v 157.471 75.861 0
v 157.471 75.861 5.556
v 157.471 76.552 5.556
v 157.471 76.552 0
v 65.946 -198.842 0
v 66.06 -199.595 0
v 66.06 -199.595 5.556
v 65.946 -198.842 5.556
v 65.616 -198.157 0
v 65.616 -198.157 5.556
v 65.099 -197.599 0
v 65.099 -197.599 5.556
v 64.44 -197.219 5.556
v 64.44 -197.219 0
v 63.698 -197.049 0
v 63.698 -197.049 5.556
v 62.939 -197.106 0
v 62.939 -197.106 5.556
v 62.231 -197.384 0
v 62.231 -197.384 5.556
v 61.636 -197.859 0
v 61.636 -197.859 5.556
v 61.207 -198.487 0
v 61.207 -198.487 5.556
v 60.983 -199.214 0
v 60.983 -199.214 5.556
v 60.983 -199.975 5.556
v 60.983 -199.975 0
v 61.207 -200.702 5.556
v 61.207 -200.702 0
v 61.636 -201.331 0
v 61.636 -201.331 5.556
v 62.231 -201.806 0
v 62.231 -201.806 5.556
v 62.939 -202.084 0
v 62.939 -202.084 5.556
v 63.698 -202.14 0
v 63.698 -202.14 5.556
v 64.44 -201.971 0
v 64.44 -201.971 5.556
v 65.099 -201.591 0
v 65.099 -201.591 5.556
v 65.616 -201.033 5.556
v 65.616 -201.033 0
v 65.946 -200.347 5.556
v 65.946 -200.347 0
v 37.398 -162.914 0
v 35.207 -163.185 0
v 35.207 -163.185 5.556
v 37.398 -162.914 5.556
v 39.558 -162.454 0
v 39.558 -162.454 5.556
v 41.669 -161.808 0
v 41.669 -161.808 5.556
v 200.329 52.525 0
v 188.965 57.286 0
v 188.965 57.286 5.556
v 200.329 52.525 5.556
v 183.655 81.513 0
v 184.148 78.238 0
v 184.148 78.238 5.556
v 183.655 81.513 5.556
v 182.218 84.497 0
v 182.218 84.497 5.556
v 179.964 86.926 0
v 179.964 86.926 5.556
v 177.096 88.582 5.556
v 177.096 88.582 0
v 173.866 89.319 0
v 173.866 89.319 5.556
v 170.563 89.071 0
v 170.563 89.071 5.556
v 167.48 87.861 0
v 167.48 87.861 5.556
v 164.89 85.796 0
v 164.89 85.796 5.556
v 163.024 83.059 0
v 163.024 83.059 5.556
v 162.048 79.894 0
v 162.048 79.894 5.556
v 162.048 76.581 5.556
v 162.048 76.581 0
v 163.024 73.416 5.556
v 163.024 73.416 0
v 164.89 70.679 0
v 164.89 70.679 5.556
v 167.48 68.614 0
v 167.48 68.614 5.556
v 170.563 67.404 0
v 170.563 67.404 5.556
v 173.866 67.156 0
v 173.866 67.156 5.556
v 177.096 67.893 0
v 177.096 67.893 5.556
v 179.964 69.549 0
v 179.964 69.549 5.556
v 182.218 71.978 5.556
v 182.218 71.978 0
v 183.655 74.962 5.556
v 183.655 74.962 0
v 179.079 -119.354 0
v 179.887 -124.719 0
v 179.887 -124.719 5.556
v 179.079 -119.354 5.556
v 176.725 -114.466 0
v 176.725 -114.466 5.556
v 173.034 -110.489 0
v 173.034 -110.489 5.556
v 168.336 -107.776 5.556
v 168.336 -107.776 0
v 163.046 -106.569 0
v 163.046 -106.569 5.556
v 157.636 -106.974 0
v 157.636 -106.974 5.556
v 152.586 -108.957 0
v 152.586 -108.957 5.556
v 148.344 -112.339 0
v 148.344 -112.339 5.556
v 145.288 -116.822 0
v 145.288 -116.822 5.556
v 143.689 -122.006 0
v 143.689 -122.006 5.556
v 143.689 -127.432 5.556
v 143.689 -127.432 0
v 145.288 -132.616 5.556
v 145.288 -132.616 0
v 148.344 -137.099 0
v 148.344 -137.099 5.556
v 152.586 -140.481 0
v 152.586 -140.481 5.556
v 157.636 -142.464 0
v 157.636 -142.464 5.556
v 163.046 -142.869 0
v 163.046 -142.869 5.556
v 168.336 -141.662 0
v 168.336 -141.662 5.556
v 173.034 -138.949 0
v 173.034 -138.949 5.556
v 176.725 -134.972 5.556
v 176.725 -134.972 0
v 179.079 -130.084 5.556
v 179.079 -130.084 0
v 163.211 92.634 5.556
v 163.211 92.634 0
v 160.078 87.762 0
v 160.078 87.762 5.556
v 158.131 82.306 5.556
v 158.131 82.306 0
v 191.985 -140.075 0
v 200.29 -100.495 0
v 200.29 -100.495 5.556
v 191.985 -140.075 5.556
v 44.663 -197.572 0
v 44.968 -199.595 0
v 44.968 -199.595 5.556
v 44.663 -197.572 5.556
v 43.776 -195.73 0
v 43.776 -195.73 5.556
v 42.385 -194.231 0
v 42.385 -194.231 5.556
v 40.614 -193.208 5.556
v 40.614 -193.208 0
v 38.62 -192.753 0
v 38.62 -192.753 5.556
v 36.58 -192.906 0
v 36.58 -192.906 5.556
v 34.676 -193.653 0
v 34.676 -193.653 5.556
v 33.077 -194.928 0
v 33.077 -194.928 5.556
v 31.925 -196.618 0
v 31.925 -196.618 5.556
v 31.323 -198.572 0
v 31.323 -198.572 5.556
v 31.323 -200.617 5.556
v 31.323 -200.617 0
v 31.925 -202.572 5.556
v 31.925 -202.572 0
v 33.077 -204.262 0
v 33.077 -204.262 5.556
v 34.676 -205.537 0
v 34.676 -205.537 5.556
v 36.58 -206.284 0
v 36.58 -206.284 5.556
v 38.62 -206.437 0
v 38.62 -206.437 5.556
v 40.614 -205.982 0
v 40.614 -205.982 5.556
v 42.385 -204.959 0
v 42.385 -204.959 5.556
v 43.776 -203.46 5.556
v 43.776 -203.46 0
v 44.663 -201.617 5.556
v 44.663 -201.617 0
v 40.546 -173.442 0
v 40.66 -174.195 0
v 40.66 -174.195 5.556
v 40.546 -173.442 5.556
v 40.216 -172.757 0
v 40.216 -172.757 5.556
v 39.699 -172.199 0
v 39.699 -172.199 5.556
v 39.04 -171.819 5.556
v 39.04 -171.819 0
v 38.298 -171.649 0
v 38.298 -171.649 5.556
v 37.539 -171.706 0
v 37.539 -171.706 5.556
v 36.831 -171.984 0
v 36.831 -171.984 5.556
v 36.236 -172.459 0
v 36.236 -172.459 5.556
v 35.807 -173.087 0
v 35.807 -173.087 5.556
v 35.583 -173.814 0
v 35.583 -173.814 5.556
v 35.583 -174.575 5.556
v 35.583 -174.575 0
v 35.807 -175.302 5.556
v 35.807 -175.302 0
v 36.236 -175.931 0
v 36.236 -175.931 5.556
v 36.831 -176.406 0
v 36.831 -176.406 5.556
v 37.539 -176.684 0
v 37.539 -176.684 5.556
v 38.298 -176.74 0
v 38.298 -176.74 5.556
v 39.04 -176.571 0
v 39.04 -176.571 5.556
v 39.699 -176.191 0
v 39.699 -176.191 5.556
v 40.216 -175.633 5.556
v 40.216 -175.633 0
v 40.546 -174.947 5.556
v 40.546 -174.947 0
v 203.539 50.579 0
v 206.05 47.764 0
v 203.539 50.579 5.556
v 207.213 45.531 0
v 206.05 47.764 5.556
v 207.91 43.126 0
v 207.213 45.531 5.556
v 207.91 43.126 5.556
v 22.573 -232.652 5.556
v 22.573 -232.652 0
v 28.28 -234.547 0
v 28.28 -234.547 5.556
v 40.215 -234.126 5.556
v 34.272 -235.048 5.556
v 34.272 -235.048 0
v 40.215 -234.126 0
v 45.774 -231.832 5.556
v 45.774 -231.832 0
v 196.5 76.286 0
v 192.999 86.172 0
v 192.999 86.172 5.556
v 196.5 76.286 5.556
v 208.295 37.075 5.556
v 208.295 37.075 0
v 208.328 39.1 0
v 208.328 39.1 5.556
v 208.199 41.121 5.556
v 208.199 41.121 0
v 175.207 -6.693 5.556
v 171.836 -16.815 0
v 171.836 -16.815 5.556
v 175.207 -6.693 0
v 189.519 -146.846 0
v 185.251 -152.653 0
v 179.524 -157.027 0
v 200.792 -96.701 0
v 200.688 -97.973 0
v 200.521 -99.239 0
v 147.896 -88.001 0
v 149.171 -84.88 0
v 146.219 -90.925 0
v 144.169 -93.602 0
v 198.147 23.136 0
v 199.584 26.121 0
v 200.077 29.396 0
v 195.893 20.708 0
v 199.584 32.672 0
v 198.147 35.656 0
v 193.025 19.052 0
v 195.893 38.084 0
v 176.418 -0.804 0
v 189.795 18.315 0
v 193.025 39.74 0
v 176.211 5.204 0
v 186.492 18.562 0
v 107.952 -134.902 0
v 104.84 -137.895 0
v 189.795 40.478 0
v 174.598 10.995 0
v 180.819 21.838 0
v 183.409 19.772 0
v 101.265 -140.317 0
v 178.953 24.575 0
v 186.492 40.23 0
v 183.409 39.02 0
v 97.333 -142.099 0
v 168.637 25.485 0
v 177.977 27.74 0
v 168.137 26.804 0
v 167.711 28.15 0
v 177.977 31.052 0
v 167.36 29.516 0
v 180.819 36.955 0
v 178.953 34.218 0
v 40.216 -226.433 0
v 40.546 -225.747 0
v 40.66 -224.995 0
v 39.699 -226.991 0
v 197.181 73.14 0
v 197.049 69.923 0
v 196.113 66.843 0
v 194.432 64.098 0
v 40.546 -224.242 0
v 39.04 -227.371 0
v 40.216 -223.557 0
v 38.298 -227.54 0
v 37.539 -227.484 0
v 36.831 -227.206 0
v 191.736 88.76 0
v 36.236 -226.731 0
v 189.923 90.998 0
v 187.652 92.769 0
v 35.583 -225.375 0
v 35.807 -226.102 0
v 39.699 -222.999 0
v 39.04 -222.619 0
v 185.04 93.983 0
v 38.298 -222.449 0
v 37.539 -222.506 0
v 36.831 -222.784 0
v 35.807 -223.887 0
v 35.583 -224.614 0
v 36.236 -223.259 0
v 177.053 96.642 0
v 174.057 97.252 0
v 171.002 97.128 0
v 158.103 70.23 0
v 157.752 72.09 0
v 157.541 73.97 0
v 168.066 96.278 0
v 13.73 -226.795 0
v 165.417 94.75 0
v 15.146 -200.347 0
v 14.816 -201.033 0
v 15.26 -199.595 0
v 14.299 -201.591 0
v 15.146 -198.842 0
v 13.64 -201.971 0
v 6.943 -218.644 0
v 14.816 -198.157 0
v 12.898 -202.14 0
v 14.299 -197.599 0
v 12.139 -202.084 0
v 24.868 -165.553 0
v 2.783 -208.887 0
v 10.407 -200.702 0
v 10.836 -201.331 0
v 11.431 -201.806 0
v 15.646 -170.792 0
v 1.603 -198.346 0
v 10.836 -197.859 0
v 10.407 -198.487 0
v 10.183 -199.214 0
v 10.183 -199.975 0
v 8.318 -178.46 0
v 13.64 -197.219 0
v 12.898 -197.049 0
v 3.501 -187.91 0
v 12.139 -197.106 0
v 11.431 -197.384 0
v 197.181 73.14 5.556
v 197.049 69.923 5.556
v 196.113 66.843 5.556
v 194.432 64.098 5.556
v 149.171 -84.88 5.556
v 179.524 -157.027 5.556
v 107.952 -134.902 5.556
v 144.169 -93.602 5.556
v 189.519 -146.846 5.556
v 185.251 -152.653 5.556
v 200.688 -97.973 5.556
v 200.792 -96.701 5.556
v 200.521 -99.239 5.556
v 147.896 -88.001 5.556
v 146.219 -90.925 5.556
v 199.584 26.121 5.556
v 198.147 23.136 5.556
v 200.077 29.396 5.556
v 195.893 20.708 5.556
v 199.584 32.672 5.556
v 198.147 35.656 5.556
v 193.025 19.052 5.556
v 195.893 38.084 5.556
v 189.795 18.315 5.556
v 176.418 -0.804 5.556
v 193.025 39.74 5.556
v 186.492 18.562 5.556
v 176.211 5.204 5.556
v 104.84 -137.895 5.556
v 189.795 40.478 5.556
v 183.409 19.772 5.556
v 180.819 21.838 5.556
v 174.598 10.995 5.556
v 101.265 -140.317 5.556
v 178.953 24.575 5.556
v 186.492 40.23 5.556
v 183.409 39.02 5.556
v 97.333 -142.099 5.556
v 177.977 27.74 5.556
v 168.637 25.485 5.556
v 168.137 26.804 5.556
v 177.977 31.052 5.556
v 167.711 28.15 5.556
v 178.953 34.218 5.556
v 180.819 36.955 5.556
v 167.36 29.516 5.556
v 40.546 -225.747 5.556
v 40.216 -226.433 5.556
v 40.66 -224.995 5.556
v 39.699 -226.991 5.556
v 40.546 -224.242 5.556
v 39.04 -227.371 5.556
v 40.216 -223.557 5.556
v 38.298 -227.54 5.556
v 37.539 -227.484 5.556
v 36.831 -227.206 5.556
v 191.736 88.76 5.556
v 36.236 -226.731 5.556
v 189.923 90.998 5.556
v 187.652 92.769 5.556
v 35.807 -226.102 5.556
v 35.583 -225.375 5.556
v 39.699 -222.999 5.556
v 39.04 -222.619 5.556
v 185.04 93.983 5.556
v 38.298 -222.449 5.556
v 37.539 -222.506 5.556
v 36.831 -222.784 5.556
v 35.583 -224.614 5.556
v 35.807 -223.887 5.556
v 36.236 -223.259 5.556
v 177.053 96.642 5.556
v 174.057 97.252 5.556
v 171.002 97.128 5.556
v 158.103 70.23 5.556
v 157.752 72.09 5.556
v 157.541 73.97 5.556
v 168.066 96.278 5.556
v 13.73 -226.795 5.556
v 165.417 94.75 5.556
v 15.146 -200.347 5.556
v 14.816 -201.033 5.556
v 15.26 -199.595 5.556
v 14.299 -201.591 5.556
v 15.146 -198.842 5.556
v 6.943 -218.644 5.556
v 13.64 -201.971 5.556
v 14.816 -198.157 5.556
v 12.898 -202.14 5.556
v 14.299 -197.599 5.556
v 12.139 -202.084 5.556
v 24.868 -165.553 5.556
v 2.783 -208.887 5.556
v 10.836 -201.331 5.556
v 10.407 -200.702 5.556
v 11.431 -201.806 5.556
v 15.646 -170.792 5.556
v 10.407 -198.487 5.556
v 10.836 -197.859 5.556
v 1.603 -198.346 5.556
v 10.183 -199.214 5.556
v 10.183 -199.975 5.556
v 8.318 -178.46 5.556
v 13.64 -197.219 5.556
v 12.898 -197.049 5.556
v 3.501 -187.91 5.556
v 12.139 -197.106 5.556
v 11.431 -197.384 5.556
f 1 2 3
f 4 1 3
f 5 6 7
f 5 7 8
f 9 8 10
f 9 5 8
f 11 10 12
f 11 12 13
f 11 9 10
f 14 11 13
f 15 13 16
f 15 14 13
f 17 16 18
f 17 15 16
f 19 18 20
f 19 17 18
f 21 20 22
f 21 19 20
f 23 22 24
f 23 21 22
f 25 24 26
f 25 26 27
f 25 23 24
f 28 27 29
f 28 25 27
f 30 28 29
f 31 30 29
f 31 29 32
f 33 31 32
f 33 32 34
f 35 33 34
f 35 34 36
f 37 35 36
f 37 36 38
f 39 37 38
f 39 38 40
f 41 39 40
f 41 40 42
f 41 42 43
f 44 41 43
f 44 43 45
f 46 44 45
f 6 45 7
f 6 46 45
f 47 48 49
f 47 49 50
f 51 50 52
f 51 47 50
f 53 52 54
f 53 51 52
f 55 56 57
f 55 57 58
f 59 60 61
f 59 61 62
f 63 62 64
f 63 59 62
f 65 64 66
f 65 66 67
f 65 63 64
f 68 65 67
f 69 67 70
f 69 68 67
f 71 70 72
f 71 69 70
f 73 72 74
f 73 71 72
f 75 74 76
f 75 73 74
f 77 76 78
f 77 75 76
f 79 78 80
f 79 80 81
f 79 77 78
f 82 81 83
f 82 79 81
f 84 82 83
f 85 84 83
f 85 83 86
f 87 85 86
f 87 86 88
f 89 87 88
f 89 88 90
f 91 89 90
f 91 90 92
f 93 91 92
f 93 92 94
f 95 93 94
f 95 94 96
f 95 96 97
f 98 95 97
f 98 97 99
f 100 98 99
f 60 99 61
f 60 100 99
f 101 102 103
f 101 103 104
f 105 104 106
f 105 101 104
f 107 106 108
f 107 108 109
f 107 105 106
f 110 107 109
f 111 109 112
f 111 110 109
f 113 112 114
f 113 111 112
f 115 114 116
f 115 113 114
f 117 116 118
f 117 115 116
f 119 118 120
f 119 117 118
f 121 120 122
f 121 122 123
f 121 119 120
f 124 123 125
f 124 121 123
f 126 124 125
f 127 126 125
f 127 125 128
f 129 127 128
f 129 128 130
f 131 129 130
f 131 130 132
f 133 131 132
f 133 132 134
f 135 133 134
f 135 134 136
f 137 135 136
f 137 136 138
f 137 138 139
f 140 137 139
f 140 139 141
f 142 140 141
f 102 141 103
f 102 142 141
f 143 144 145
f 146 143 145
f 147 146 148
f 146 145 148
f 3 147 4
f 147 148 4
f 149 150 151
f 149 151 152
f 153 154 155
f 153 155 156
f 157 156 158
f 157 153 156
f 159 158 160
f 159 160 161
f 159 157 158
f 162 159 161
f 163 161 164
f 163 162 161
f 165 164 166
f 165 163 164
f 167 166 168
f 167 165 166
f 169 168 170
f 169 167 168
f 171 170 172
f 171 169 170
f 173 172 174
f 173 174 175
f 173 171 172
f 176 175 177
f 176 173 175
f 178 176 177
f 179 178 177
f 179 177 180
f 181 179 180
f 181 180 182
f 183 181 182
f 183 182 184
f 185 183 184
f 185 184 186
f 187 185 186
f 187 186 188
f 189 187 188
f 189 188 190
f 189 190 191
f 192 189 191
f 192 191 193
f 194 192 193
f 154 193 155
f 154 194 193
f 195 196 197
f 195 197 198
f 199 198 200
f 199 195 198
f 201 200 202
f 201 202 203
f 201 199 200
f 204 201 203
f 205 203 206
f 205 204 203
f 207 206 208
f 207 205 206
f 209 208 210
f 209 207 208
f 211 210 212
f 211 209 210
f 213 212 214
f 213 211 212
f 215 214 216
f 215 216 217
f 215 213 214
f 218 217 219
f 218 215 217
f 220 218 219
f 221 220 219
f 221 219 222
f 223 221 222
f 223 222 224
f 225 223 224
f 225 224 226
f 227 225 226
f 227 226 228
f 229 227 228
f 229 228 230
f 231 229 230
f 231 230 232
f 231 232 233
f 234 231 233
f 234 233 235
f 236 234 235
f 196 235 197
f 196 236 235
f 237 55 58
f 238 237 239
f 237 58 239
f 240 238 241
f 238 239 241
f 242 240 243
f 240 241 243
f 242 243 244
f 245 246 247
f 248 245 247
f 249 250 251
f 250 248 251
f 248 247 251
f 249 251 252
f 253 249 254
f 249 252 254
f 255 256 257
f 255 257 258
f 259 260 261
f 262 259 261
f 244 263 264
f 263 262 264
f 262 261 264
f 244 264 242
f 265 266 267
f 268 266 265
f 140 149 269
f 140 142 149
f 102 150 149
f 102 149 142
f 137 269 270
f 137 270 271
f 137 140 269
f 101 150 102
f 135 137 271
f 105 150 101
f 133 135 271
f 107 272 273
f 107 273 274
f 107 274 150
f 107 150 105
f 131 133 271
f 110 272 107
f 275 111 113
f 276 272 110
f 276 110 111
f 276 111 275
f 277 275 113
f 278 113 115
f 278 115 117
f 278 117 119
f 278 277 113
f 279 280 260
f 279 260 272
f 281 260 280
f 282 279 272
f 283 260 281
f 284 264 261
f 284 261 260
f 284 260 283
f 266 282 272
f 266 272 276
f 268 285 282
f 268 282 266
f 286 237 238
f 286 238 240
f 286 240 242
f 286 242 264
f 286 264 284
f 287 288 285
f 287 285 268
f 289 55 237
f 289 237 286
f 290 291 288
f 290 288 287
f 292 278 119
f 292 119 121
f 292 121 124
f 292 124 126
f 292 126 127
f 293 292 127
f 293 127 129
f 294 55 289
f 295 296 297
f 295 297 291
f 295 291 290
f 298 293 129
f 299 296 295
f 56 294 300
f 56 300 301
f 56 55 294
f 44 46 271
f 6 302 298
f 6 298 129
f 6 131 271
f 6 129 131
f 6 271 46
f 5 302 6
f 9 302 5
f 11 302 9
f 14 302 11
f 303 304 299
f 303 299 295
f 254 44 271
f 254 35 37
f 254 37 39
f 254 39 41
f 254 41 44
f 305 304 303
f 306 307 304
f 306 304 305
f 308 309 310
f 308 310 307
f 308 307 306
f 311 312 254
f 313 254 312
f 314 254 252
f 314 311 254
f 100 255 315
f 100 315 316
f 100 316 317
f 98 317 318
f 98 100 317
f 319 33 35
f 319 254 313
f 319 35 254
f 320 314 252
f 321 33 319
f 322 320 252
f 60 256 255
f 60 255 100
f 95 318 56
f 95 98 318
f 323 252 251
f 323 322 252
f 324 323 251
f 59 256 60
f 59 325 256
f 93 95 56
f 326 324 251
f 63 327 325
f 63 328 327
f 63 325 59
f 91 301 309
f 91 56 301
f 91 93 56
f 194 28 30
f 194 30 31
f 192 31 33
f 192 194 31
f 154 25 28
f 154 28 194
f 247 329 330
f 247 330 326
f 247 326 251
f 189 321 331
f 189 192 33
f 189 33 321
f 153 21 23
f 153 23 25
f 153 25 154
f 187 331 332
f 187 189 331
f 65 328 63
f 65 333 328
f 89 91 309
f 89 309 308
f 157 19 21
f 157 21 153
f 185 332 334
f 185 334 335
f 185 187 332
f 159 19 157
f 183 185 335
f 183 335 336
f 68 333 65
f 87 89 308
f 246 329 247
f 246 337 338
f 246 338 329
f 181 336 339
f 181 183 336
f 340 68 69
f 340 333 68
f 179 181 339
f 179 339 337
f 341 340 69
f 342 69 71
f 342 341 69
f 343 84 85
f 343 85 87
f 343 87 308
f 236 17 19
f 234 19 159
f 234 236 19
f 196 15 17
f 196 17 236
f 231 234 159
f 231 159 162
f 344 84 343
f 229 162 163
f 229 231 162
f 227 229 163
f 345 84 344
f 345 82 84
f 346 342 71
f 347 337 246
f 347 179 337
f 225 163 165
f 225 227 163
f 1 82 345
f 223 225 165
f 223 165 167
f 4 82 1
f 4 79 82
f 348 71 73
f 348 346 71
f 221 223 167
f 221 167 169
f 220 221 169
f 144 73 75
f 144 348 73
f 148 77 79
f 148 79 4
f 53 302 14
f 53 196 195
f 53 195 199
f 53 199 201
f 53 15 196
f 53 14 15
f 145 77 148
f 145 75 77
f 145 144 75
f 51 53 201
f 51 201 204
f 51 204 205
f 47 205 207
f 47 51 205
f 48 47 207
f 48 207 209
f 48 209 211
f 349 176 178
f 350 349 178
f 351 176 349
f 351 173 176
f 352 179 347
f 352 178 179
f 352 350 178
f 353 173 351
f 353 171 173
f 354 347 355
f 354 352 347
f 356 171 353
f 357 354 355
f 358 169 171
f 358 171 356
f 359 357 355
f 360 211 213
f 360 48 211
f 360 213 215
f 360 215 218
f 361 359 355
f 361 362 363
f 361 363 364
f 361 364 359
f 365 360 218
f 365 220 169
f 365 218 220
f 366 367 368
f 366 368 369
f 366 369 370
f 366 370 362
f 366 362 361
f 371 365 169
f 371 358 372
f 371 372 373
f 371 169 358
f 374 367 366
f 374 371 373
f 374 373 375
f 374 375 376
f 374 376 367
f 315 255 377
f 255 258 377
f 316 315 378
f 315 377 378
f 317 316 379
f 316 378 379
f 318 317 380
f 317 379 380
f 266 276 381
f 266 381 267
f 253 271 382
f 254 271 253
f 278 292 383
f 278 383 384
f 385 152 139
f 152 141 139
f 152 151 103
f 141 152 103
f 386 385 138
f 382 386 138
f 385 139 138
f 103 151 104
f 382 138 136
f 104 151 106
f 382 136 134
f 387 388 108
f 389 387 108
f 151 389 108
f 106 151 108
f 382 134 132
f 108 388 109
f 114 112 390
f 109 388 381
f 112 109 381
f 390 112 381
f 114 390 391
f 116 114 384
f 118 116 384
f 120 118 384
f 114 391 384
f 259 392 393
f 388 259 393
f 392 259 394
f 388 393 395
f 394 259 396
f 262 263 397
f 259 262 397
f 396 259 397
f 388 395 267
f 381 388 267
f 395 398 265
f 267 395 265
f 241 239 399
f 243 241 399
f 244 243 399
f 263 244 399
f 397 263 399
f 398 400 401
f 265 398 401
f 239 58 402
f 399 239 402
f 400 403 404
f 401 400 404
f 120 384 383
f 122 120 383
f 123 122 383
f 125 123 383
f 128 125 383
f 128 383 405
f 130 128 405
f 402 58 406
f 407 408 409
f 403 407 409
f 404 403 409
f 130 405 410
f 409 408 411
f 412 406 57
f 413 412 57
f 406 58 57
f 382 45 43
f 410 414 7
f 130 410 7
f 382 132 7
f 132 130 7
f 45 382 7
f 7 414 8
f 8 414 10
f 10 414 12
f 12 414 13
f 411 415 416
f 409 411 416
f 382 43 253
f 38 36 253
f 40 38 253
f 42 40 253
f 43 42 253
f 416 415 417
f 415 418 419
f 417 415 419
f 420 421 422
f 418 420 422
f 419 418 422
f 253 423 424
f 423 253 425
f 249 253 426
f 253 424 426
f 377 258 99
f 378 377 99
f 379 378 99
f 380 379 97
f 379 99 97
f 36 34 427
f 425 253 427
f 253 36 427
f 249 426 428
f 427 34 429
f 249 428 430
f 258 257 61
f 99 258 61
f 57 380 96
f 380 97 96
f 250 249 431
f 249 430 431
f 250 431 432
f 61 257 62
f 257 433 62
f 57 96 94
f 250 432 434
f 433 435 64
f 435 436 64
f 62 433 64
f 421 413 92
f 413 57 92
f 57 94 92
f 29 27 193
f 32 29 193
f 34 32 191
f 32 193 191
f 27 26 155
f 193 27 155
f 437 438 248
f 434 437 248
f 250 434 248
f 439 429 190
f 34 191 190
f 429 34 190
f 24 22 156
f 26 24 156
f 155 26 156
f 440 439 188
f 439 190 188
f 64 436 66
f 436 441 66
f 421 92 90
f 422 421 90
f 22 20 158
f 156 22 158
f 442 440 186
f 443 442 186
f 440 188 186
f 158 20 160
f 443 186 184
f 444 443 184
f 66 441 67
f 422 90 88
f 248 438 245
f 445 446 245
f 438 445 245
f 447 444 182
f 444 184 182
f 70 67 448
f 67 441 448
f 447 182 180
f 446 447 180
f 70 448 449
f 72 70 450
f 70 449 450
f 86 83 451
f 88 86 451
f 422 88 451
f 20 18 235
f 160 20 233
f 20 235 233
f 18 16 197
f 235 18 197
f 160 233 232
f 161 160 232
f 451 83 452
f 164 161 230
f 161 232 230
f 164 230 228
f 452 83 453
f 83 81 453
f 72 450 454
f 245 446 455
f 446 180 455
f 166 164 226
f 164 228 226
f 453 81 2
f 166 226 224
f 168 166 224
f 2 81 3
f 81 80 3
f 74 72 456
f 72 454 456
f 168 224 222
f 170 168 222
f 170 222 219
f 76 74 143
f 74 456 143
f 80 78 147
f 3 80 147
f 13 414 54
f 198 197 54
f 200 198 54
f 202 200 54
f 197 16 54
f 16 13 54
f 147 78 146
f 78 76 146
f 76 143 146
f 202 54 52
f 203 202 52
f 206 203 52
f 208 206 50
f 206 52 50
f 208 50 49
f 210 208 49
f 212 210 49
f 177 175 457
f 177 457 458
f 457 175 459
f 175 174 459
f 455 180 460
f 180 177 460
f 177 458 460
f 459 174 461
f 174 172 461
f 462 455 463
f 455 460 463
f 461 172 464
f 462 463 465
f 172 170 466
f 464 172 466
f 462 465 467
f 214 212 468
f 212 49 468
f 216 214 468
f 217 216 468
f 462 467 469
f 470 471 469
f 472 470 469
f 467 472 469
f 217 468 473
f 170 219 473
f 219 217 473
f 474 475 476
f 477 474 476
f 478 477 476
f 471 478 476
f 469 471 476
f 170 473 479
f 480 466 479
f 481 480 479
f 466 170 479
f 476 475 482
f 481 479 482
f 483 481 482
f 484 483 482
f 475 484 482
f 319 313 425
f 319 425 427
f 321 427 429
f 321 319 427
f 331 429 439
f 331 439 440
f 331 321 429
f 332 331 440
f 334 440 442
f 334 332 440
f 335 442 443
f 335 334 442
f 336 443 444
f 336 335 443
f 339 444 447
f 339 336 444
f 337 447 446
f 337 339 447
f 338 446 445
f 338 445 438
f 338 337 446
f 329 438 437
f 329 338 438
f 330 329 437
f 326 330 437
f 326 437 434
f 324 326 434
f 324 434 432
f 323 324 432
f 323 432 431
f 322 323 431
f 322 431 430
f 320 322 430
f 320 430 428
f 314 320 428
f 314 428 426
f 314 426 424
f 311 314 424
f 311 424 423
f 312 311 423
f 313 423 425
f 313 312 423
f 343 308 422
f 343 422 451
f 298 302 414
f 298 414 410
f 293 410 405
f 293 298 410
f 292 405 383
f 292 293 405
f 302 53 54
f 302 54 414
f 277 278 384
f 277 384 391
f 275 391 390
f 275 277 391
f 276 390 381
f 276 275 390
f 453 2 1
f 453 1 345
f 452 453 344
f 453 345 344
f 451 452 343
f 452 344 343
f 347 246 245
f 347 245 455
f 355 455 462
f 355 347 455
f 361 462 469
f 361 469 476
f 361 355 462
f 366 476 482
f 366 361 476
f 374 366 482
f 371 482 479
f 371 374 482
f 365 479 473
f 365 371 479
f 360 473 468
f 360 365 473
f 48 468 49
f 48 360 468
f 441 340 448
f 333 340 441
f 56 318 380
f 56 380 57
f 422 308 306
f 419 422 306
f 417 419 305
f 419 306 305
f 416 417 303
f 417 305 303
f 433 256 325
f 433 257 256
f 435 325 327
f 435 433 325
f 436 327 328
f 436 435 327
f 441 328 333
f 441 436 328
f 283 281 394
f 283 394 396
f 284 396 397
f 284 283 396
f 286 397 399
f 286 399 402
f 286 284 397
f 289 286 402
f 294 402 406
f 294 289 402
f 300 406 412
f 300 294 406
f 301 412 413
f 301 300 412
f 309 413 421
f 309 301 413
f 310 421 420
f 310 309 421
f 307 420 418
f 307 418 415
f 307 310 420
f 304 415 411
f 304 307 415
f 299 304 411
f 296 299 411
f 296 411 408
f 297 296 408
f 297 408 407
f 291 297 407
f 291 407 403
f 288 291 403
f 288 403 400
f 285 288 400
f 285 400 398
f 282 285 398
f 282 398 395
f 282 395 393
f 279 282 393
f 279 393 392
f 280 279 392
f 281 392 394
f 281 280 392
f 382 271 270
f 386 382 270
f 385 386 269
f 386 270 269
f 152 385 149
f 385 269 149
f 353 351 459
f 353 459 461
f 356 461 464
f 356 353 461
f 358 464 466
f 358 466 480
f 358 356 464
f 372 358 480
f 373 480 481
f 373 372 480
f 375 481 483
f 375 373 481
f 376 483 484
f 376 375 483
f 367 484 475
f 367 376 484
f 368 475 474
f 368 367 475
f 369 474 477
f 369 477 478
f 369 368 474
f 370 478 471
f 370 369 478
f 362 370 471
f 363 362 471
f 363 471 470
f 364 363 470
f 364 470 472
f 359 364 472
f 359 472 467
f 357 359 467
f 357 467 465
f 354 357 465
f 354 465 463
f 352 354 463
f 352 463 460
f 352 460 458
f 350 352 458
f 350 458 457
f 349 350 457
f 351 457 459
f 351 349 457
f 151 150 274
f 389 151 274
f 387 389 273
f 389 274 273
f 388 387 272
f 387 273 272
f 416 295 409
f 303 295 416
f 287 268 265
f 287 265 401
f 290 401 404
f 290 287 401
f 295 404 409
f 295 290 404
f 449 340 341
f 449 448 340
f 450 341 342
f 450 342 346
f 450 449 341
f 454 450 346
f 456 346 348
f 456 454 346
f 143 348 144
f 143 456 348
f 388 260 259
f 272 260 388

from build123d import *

# Parameters (mm, degrees)
SKETCH1_R           = 6.861165386
SKETCH1_R_2         = 18.200911839
SKETCH1_R_3         = 11.1125
SKETCH1_R_4         = 2.5527
BOSS_EXTRUDE1_DEPTH = 5.55625
FILLET1_R           = 25.4
FILLET3_R           = 12.7
FILLET4_R           = 12.7


with BuildPart() as part:
    # Sketch1 → Boss-Extrude1 (new body)
    with BuildSketch(Plane.XY):
        with BuildLine():
            Line((198.861588808, 69.615973931), (188.964925061, 57.285610842))
            Line((188.964925061, 57.285610842), (205.711419625, 50.270822653))
            Line((205.711419625, 50.270822653), (208.580766503, 42.167272229))
            Line((208.580766503, 42.167272229), (200.684125291, -98.616772294))
            Line((200.684125291, -98.616772294), (189.611167808, -151.385643895))
            Line((189.611167808, -151.385643895), (38.107034572, -236.120024372))
            ThreePointArc((38.107034572, -236.120024372), (1.581834572, -199.594824372), (38.107034572, -163.069624372))
            Line((38.107034572, -163.069624372), (103.581383992, -139.886129452))
            Line((103.581383992, -139.886129452), (147.550432491, -89.7457244))
            Line((147.550432491, -89.7457244), (171.836242771, -16.814689905))
            Line((171.836242771, -16.814689905), (178.189444477, 2.26417003))
            Line((178.189444477, 2.26417003), (167.830043749, 27.447208055))
            Line((167.830043749, 27.447208055), (157.470643022, 73.010133983))
            Line((157.470643022, 73.010133983), (157.470643022, 93.390021886))
            Line((157.470643022, 93.390021886), (170.600142232, 98.791028052))
            Line((170.600142232, 98.791028052), (190.927975242, 92.021922153))
            Line((190.927975242, 92.021922153), (198.861588808, 69.615973931))
        make_face()
        with Locations((38.107034572, -199.594824372)):
            Circle(SKETCH1_R, mode=Mode.SUBTRACT)
        with Locations((161.686314612, -124.719021489)):
            Circle(SKETCH1_R_2, mode=Mode.SUBTRACT)
        with Locations((188.964925061, 29.396113336)):
            Circle(SKETCH1_R_3, mode=Mode.SUBTRACT)
        with Locations((173.035965272, 78.237579188)):
            Circle(SKETCH1_R_3, mode=Mode.SUBTRACT)
        with Locations((38.107034572, -174.194824372)):
            Circle(SKETCH1_R_4, mode=Mode.SUBTRACT)
        with Locations((63.507034572, -199.594824372)):
            Circle(SKETCH1_R_4, mode=Mode.SUBTRACT)
        with Locations((38.107034572, -224.994824372)):
            Circle(SKETCH1_R_4, mode=Mode.SUBTRACT)
        with Locations((12.707034572, -199.594824372)):
            Circle(SKETCH1_R_4, mode=Mode.SUBTRACT)
    extrude(amount=BOSS_EXTRUDE1_DEPTH)

    # Fillet1
    # the kernel refuses this fillet: 25.4 mm, written as the material it adds along each edge
    with BuildSketch(Plane(origin=(178.189444477, 2.26417003, 0), x_dir=(-0.38043310119112933, 0.9248084426074947, 0), z_dir=(0, 0, 1))) as fillet1_piece_1:
        with BuildLine():
            CenterArc((FILLET1_R * 0.371679258358, FILLET1_R), FILLET1_R, 229.221887669, 40.778112331)
            Line((-FILLET1_R * 0.281452116845, FILLET1_R * 0.242755385146), (0, 0))
            Line((0, 0), (FILLET1_R * 0.371679258358, 0))
        make_face()
    extrude(amount=5.55625)
    with BuildSketch(Plane(origin=(147.550432491, -89.7457244, 0), x_dir=(0.315940492730092, 0.948779007489872, 0), z_dir=(0, 0, 1))) as fillet1_piece_2:
        with BuildLine():
            CenterArc((FILLET1_R * 0.201912574353, FILLET1_R), FILLET1_R, 247.169477311, 22.830522689)
            Line((-FILLET1_R * 0.186094053331, FILLET1_R * 0.0783434170618), (0, 0))
            Line((0, 0), (FILLET1_R * 0.201912574353, 0))
        make_face()
    extrude(amount=5.55625)
    with BuildSketch(Plane(origin=(103.581383992, -139.886129452, 0), x_dir=(-0.9426514039125685, -0.333778864971501, 0), z_dir=(0, 0, 1))) as fillet1_piece_3:
        with BuildLine():
            CenterArc((FILLET1_R * 0.26097983986, -FILLET1_R), FILLET1_R, 90, 29.253579042)
            Line((-FILLET1_R * 0.22769590207, -FILLET1_R * 0.127534516872), (0, 0))
            Line((0, 0), (FILLET1_R * 0.26097983986, 0))
        make_face()
    extrude(amount=5.55625)
    with BuildSketch(Plane(origin=(38.107034572, -163.069624372, 0), x_dir=(0.9426514039125696, 0.3337788649714982, 0), z_dir=(0, 0, 1))) as fillet1_piece_4:
        with BuildLine():
            CenterArc((3.778567788, 25.4), FILLET1_R, 255.05508403, 14.94491597)
            ThreePointArc((-2.771845496, 0.85917512), (-1.377386631, 0.457126529), (0, 0))
            Line((0, 0), (3.778567788, 0))
        make_face()
    extrude(amount=5.55625)
    # the kernel refuses this fillet: 25.4 mm, written as the material it takes off along each edge
    with BuildSketch(Plane(origin=(157.470643022, 93.390021886, -42.096203676), x_dir=(0, -1, 0), z_dir=(0, 0, 1))) as fillet1_2_piece_1:
        with BuildLine():
            CenterArc((16.83848147, 25.4), FILLET1_R, 208.887448124, 61.112551876)
            Line((-5.401006167, 13.12949921), (0, 0))
            Line((0, 0), (16.83848147, 0))
        make_face()
    extrude(amount=89.748657352, mode=Mode.SUBTRACT)
    with BuildSketch(Plane(origin=(157.470643022, 73.010133983, -7.12787144), x_dir=(0.22170637645104777, -0.9751134716744232, 0), z_dir=(0, 0, 1))) as fillet1_2_piece_2:
        with BuildLine():
            CenterArc((FILLET1_R * 0.11224994393, FILLET1_R), FILLET1_R, 257.190723516, 12.809276484)
            Line((-FILLET1_R * 0.109456432521, FILLET1_R * 0.0248865283256), (0, 0))
            Line((0, 0), (FILLET1_R * 0.11224994393, 0))
        make_face()
    extrude(amount=19.811992879, mode=Mode.SUBTRACT)
    with BuildSketch(Plane(origin=(167.830043749, 27.447208055, -5.305032246), x_dir=(0.3804331011911332, -0.9248084426074932, 0), z_dir=(0, 0, 1))) as fillet1_2_piece_3:
        with BuildLine():
            CenterArc((FILLET1_R * 0.0835438149047, FILLET1_R), FILLET1_R, 260.448763965, 9.551236035)
            Line((-FILLET1_R * 0.0823856984158, FILLET1_R * 0.0138623845481), (0, 0))
            Line((0, 0), (FILLET1_R * 0.0835438149047, 0))
        make_face()
    extrude(amount=16.166314493, mode=Mode.SUBTRACT)
    with BuildSketch(Plane(origin=(38.107034572, -236.120024372, -39.792317969), x_dir=(0.8727709569033328, 0.48812995891057614, 0), z_dir=(0, 0, 1))) as fillet1_2_piece_4:
        with BuildLine():
            CenterArc((8.784495846, 25.4), FILLET1_R, 215.61203078, 54.38796922)
            ThreePointArc((-11.865158329, 10.609740285), (-6.517544718, 4.650687408), (0, 0))
            Line((0, 0), (8.784495846, 0))
        make_face()
    extrude(amount=85.140885938, mode=Mode.SUBTRACT)
    with BuildSketch(Plane(origin=(189.611167808, -151.385643895, -28.892669195), x_dir=(0.20536614533433253, 0.9786852131050707, 0), z_dir=(0, 0, 1))) as fillet1_2_piece_5:
        with BuildLine():
            CenterArc((FILLET1_R * 0.455002664481, FILLET1_R), FILLET1_R, 221.068676821, 48.931323179)
            Line((-FILLET1_R * 0.298919997384, FILLET1_R * 0.343036819962), (0, 0))
            Line((0, 0), (FILLET1_R * 0.455002664481, 0))
        make_face()
    extrude(amount=63.341588389, mode=Mode.SUBTRACT)
    with BuildSketch(Plane(origin=(200.684125291, -98.616772294, -4.797187782), x_dir=(0.056002429151398234, 0.9984306325074078, 0), z_dir=(0, 0, 1))) as fillet1_2_piece_6:
        with BuildLine():
            CenterArc((FILLET1_R * 0.075546264279, FILLET1_R), FILLET1_R, 261.359448749, 8.640551251)
            Line((-FILLET1_R * 0.0746888367943, FILLET1_R * 0.0113497006497), (0, 0))
            Line((0, 0), (FILLET1_R * 0.075546264279, 0))
        make_face()
    extrude(amount=15.150625563, mode=Mode.SUBTRACT)
    with BuildSketch(Plane(origin=(208.580766503, 42.167272229, -12.751193258), x_dir=(-0.33377886497150366, 0.9426514039125676, 0), z_dir=(0, 0, 1))) as fillet1_2_piece_7:
        with BuildLine():
            CenterArc((FILLET1_R * 0.200806193046, FILLET1_R), FILLET1_R, 247.291319111, 22.708680889)
            Line((-FILLET1_R * 0.185239618687, FILLET1_R * 0.0775203897954), (0, 0))
            Line((0, 0), (FILLET1_R * 0.200806193046, 0))
        make_face()
    extrude(amount=31.058636517, mode=Mode.SUBTRACT)

    # Fillet3
    fillet3_edges = [part.edges().sort_by_distance(p)[0] for p in [
        (170.600142232, 98.791028052, 2.778125),
        (190.927975242, 92.021922153, 2.778125),
    ]]
    fillet(fillet3_edges, radius=FILLET3_R)

    # Fillet4
    fillet4_edges = [part.edges().sort_by_distance(p)[0] for p in [
        (205.711419625, 50.270822653, 2.778125),
        (198.861588808, 69.615973931, 2.778125),
    ]]
    fillet(fillet4_edges, radius=FILLET4_R)


solid = part.part
